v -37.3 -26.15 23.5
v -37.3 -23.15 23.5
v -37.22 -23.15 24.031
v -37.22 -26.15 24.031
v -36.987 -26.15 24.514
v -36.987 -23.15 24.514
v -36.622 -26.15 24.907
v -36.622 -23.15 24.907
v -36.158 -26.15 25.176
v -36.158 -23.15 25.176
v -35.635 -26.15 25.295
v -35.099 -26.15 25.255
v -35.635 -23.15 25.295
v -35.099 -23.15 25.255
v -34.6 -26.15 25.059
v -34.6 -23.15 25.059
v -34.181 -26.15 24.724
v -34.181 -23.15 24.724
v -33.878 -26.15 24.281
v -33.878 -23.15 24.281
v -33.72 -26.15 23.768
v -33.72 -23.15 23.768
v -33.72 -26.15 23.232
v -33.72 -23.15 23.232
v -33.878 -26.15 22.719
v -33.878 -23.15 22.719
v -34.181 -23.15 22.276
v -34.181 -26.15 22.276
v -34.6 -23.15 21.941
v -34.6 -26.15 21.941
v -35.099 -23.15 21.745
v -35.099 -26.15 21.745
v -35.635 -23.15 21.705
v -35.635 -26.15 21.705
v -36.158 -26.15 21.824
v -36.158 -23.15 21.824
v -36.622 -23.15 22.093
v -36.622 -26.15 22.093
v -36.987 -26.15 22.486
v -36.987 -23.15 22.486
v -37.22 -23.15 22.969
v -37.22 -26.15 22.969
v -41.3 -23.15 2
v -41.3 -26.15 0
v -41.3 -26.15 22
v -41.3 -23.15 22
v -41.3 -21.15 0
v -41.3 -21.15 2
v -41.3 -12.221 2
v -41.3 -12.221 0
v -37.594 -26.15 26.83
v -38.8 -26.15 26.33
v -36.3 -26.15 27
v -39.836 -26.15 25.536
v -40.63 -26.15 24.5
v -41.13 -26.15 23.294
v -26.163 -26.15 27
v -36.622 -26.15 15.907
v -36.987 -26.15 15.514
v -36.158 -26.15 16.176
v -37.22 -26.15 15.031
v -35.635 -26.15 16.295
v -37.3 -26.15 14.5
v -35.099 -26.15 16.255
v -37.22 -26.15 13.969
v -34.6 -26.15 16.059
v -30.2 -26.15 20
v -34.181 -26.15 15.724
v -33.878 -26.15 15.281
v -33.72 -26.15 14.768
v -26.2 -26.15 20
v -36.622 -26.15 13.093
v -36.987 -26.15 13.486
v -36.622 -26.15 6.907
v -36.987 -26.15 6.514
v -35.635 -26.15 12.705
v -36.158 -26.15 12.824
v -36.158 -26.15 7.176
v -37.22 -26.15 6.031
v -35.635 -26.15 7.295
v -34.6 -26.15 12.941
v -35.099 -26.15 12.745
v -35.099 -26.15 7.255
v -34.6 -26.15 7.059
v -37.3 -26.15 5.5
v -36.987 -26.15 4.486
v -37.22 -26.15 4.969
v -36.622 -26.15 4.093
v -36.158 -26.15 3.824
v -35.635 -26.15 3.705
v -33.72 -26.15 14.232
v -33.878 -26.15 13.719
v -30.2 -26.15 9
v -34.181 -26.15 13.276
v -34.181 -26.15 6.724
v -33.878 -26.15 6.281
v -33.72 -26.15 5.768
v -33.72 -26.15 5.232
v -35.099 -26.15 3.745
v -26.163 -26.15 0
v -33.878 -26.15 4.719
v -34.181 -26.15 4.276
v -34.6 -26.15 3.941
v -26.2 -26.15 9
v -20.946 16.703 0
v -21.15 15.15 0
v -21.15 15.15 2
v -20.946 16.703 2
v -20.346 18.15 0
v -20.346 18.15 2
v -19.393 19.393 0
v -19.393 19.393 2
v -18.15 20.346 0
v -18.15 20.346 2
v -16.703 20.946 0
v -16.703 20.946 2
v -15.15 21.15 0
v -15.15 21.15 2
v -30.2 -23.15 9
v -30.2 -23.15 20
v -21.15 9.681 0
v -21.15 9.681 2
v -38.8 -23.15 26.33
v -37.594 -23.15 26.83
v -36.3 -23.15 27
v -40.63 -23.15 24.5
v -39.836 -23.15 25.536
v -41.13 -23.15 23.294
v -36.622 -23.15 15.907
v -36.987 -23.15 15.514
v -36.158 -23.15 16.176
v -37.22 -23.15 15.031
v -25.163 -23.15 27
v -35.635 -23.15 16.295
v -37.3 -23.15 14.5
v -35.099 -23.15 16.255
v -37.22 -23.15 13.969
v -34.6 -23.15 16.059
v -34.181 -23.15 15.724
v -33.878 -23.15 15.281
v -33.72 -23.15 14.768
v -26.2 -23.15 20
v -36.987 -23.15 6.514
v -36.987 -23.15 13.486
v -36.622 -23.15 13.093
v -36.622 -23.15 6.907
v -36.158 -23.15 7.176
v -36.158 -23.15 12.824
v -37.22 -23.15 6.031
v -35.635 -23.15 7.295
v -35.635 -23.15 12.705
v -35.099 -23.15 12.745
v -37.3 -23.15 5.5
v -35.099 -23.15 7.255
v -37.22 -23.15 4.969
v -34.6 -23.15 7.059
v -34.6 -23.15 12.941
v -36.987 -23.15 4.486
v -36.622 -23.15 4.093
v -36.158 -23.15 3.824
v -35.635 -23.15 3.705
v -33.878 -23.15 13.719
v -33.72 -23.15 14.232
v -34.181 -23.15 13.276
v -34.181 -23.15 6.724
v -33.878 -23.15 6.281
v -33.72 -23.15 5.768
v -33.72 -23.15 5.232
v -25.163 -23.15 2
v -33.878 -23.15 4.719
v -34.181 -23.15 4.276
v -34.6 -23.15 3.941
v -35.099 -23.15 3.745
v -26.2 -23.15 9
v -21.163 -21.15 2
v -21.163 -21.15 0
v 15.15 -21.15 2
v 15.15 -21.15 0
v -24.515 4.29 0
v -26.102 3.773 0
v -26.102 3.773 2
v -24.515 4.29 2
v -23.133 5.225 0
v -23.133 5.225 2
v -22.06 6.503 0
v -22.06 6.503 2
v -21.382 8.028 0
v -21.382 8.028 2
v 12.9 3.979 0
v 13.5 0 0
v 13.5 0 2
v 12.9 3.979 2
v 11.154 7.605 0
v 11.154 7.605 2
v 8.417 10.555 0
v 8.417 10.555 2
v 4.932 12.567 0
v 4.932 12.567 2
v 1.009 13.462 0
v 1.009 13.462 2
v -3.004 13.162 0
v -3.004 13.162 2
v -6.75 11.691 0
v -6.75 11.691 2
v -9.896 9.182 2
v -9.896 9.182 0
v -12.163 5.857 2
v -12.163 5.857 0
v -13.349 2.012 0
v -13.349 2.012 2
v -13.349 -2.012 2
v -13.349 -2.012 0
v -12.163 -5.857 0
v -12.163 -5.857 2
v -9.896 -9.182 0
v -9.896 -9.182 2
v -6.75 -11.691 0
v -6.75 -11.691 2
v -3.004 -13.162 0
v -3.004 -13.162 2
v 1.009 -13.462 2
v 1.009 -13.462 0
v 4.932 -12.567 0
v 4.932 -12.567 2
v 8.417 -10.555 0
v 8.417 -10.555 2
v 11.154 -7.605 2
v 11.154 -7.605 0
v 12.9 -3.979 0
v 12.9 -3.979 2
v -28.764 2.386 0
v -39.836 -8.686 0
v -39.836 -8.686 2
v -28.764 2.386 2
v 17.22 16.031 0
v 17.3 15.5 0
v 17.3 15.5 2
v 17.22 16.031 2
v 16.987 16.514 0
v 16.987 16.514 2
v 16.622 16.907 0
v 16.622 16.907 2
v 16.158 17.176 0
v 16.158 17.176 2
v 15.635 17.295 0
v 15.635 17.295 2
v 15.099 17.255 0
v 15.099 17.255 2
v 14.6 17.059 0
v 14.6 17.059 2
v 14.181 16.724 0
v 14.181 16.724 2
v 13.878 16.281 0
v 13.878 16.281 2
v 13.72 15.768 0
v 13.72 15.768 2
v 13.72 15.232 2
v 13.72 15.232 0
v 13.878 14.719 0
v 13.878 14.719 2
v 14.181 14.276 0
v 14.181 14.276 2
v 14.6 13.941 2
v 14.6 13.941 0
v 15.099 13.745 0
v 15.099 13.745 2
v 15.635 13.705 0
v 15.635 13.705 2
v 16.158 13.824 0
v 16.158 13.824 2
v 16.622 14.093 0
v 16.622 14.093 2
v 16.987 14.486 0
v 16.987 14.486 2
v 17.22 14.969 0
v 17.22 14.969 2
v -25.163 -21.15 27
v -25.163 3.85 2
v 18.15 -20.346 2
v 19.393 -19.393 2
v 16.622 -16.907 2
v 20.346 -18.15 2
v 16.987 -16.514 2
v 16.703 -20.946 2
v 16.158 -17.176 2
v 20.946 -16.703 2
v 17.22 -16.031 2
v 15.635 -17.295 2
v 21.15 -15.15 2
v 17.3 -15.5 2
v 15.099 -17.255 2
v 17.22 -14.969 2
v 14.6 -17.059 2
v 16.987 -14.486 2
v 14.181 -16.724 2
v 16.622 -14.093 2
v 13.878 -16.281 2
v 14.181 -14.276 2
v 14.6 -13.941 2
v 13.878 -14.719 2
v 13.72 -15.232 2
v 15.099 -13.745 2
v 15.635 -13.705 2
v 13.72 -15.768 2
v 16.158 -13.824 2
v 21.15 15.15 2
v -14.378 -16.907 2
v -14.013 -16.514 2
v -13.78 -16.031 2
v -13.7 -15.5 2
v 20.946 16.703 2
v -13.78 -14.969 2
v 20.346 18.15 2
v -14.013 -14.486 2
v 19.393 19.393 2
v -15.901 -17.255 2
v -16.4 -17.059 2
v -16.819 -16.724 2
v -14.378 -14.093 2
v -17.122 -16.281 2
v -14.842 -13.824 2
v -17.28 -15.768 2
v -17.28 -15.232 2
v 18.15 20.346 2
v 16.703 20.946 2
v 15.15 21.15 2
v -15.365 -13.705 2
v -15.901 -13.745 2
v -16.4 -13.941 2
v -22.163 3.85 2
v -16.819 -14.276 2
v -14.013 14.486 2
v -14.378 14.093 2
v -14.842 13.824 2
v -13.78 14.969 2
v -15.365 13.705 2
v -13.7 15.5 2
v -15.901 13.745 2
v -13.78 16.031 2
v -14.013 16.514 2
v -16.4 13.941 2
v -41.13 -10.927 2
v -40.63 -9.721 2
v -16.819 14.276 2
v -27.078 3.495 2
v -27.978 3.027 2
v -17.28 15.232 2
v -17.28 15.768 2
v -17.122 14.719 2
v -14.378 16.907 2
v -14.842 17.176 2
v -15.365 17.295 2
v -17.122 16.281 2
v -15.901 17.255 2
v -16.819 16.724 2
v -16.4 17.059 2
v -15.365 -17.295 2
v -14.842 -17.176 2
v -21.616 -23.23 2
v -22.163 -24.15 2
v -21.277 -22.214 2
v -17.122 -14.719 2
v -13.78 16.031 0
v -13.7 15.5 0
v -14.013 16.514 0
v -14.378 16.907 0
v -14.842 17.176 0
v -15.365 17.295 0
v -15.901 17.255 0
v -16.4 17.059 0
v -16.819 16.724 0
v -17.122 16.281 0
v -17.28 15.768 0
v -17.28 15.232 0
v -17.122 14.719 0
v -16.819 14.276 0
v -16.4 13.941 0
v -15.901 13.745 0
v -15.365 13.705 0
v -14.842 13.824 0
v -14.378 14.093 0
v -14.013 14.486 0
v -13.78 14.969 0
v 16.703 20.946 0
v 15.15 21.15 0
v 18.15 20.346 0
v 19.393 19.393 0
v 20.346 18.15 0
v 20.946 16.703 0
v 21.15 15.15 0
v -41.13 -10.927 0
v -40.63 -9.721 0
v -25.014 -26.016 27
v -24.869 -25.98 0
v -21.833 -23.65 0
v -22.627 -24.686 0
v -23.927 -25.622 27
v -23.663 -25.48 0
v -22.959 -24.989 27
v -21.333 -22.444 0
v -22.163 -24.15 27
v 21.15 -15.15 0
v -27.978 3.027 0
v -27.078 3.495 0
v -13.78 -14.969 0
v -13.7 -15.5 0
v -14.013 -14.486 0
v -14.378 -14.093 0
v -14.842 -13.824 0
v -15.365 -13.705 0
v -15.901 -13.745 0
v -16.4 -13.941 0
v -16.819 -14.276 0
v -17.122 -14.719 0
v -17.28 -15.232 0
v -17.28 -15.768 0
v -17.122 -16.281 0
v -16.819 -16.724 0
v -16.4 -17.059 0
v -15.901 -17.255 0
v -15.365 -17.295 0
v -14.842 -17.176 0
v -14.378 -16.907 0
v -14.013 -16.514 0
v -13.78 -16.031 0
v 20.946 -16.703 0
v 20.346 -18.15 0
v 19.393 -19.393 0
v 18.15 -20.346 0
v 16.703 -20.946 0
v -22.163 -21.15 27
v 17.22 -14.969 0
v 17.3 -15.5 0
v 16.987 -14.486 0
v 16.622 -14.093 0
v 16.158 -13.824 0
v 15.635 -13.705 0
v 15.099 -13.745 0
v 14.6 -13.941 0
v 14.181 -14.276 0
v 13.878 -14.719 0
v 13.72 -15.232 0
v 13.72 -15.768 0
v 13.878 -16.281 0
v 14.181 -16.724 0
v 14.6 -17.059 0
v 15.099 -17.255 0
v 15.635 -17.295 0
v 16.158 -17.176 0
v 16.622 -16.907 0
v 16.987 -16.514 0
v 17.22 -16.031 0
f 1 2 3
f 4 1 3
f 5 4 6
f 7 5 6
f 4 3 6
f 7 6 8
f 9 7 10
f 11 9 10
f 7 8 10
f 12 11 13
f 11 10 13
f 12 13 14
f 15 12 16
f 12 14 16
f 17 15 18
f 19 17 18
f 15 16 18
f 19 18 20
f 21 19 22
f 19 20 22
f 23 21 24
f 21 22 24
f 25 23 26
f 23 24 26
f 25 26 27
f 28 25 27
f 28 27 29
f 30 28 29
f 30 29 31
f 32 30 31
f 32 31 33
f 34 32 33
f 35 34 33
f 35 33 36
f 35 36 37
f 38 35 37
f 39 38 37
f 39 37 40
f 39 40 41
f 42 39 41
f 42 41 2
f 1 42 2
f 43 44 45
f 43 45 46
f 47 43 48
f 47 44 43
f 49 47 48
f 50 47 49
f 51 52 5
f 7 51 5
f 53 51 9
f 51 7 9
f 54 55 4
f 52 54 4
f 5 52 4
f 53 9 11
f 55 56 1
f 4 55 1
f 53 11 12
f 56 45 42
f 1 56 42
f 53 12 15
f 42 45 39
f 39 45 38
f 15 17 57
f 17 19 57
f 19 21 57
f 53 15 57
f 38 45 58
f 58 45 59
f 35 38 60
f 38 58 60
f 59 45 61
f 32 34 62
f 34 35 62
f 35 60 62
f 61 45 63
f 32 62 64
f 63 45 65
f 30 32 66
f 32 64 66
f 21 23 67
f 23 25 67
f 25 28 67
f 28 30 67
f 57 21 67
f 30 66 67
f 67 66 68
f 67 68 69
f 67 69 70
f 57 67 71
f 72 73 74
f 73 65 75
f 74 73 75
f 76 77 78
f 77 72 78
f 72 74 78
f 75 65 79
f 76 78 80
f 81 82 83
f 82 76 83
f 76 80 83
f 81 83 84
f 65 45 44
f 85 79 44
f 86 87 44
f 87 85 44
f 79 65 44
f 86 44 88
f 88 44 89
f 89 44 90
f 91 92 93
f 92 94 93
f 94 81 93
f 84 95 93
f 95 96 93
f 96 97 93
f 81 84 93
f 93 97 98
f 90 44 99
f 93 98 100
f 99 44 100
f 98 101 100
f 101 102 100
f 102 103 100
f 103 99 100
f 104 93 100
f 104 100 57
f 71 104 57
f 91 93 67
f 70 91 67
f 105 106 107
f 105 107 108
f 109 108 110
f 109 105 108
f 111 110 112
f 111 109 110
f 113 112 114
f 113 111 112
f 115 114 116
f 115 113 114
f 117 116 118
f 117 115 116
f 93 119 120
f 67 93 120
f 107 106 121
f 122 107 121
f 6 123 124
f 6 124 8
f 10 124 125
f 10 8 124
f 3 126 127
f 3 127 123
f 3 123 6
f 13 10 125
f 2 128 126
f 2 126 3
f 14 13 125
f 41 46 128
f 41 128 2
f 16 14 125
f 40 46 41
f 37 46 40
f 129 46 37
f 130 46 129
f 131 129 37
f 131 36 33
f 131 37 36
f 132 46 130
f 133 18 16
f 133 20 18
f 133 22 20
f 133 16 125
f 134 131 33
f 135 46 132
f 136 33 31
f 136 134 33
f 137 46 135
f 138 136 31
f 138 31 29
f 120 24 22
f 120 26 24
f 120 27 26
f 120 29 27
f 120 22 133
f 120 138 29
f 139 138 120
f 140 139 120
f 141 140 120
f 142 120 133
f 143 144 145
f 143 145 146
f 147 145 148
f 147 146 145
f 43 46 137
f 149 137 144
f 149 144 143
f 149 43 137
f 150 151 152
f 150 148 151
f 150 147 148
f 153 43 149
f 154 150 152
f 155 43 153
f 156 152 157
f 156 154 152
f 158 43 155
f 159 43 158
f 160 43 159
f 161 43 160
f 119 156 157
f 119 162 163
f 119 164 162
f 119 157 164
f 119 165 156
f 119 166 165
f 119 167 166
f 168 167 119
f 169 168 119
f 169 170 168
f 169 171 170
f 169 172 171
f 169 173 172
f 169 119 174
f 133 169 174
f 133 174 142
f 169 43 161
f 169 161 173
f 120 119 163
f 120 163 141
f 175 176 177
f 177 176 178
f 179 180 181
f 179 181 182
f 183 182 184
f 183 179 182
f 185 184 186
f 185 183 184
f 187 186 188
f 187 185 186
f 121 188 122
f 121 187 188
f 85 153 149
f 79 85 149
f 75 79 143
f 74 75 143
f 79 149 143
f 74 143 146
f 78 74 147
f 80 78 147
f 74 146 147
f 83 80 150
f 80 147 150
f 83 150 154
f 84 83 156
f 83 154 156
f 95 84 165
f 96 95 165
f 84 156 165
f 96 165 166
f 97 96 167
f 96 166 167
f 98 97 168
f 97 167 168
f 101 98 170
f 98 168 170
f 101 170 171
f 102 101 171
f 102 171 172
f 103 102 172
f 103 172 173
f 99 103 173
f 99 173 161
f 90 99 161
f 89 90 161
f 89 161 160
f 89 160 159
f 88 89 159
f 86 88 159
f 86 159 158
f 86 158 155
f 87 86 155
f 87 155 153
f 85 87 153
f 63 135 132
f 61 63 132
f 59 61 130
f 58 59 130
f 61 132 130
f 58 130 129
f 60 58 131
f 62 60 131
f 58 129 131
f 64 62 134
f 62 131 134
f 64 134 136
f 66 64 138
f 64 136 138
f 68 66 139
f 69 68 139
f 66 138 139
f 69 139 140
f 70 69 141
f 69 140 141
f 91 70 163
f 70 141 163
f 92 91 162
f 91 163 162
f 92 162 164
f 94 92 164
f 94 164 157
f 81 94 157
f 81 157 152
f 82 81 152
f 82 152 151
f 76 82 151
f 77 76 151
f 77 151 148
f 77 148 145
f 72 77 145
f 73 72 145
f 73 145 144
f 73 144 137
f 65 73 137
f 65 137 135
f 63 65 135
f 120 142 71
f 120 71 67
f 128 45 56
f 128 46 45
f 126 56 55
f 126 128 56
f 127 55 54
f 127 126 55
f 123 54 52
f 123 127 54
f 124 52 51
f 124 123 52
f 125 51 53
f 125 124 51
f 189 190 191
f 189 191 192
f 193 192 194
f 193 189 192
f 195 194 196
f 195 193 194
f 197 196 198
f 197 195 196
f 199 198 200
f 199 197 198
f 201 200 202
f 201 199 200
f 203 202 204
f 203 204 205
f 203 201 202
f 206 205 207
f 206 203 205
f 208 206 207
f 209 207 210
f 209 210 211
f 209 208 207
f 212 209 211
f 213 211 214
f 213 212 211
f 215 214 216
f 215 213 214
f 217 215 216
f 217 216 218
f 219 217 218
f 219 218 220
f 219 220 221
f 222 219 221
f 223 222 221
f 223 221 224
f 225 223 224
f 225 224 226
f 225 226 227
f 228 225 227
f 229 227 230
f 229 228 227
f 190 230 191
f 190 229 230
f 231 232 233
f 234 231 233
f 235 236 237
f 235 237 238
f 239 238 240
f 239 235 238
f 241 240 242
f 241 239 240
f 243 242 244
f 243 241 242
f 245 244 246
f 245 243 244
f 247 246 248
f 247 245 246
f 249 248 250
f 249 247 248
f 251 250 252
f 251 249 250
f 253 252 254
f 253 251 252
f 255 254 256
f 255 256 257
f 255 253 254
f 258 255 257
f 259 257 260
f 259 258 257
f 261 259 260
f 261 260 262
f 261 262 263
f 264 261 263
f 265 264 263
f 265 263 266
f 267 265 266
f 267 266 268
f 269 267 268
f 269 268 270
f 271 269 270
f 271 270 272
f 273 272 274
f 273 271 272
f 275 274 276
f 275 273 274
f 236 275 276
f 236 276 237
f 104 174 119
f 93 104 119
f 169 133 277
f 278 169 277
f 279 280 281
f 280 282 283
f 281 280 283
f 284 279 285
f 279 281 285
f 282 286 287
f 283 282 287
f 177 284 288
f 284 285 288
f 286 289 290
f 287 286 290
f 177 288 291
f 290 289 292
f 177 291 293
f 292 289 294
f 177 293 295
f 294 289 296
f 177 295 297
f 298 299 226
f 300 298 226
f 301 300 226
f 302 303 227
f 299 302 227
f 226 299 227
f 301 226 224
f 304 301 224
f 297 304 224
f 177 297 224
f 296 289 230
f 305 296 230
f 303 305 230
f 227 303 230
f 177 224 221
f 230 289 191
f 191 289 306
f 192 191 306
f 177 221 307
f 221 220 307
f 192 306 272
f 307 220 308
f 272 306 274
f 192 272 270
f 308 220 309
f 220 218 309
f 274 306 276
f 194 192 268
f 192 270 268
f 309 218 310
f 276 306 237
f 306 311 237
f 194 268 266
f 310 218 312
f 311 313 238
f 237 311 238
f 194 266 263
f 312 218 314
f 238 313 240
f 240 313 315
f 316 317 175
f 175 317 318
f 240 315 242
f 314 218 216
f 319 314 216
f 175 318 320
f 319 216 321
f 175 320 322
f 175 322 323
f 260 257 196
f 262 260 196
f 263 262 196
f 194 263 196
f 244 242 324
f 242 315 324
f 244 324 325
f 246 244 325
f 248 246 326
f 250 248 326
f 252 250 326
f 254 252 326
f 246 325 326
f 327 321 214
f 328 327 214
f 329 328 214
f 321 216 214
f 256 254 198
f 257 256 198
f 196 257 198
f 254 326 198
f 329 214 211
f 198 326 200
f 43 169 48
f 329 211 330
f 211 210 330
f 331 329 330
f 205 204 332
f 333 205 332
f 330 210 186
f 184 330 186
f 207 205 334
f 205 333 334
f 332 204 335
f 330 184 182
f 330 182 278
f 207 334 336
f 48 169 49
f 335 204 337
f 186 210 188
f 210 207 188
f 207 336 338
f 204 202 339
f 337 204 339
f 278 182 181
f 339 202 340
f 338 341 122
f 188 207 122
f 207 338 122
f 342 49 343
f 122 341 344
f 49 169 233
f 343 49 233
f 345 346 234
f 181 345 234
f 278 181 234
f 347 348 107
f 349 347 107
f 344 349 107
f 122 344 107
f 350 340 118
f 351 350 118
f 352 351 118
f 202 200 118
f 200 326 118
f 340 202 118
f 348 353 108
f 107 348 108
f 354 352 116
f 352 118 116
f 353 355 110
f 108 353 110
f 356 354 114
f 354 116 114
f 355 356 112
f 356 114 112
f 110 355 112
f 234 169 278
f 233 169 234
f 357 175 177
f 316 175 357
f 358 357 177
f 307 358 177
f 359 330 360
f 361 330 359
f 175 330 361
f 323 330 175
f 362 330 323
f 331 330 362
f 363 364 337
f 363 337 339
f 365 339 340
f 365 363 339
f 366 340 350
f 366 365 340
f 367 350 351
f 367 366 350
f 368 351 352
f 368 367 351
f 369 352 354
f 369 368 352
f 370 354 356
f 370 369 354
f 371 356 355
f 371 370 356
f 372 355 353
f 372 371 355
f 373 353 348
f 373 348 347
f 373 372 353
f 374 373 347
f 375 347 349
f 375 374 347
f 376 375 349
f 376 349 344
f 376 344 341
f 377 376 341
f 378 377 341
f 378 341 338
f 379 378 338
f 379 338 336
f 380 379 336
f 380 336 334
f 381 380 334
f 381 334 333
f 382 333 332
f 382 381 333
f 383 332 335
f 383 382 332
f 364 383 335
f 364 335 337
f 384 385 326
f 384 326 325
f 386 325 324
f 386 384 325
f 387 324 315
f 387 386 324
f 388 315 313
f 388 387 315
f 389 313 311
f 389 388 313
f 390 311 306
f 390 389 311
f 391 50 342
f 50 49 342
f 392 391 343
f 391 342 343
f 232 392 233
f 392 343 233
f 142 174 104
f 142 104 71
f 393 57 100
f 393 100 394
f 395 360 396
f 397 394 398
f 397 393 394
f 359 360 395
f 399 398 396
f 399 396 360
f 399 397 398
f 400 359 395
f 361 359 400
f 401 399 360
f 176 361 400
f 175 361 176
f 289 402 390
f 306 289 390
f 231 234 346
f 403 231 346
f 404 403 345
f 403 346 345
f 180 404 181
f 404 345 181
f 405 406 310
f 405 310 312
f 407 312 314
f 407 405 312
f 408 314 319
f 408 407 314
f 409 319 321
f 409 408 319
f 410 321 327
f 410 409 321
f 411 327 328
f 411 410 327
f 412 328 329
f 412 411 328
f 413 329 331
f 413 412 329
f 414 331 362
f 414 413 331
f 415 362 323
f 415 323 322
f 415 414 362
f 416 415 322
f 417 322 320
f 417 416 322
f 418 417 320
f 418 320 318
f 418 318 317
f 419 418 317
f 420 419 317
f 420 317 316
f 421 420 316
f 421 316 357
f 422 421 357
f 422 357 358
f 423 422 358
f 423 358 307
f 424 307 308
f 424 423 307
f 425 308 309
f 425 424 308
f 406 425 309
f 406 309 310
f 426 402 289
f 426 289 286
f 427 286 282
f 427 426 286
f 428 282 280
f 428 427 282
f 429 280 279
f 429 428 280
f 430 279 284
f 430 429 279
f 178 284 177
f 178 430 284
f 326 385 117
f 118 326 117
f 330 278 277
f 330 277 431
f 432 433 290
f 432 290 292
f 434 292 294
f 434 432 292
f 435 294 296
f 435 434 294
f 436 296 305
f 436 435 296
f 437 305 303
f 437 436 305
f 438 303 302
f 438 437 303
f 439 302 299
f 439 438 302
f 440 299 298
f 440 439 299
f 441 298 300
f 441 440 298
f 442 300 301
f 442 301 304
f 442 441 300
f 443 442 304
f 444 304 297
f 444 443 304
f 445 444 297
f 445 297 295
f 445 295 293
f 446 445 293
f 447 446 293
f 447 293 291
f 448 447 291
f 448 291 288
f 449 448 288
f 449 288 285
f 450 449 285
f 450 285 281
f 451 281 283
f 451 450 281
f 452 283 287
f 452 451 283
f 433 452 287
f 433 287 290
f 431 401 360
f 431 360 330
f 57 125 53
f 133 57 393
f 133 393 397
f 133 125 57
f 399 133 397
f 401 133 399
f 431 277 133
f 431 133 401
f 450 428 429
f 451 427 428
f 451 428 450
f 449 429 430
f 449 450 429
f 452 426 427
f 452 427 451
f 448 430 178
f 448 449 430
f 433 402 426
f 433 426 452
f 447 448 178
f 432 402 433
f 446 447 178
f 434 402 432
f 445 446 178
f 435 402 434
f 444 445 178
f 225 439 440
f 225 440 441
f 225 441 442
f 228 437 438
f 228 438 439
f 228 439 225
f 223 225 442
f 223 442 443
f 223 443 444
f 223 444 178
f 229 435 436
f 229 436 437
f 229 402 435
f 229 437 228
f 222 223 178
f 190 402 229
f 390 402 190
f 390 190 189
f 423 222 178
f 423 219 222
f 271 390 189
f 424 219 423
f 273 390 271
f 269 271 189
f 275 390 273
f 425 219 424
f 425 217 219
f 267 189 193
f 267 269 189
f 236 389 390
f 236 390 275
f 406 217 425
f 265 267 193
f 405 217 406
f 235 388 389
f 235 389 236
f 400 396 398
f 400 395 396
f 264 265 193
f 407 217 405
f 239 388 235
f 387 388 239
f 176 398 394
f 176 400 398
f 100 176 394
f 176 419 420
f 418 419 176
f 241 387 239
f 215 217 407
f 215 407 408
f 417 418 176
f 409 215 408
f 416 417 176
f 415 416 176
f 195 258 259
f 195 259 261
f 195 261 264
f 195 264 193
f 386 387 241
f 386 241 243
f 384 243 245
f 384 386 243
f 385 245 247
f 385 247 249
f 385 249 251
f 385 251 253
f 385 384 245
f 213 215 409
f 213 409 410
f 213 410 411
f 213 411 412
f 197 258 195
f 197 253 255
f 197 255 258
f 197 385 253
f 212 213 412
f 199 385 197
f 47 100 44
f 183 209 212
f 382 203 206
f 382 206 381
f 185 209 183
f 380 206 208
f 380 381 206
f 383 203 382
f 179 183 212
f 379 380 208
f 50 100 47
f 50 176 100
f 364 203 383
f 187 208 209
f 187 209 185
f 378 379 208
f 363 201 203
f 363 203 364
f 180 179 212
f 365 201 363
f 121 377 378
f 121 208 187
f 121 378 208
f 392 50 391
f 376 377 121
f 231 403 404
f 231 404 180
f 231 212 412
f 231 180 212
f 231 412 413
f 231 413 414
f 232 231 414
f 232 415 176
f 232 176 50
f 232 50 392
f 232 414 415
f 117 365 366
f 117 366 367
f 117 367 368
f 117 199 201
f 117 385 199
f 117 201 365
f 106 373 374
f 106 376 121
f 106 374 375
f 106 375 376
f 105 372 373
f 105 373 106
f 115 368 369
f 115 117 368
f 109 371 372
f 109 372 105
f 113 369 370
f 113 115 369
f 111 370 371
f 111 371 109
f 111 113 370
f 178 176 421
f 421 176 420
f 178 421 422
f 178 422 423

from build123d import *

# Parameters (mm, degrees)
F0_R         = 1.8
F0_R_2       = 13.5
F0_W         = 20.1372796029
F0_H         = 5
F1_DEPTH     = 2
F2_W         = 3
F2_H         = 30
F3_DEPTH     = 27
F4_W         = 16.1372796029
F4_H         = 3
F5_DEPTH     = 25
F6_R         = 1.8
F6_W         = 4
F6_H         = 11
F7_DEPTH     = 25
F8_SIZE      = 25
F9_SIZE      = 14
F10_R        = 4.99999
F11_T1_DEPTH = 2
F11_T3_DEPTH = 32


# Not quite as in the source:
# - a fillet or chamfer that OpenCascade refuses, or shapes differently, is made with other operations: its cross-section is extruded or revolved along the edge and cut away or added
# - a fillet or chamfer is up to 0.001 mm smaller than in the source, because OpenCascade refuses the exact size


with BuildPart() as f1:
    # F0 (on Top) → F1 (new body)
    with BuildSketch(Plane.XY):
        Polygon((21.15, -21.15), (21.15, 21.15), (-21.15, 21.15), (-21.15, 3.85), (-21.15, -21.15), align=None)
        with Locations((-15.5, -15.5)):
            Circle(F0_R, mode=Mode.SUBTRACT)
        with Locations((15.5, -15.5)):
            Circle(F0_R, mode=Mode.SUBTRACT)
        with Locations((-15.5, 15.5)):
            Circle(F0_R, mode=Mode.SUBTRACT)
        Circle(F0_R_2, mode=Mode.SUBTRACT)
        with Locations((15.5, 15.5)):
            Circle(F0_R, mode=Mode.SUBTRACT)
        Polygon((-21.15, -21.15), (-21.15, 3.85), (-41.3, 3.85), (-41.3, -21.15), (-21.1627203971, -21.15), align=None)
        with Locations((-31.2313601986, -23.65)):
            Rectangle(F0_W, F0_H)
    extrude(amount=F1_DEPTH)

    # F2 (on Top) → F3 (join)
    with BuildSketch(Plane.XY):
        with Locations((-23.6627203971, -11.15)):
            Rectangle(F2_W, F2_H)
    extrude(amount=F3_DEPTH)

    # F4 (on face) → F5 (join)
    with BuildSketch(Plane.XY.offset(2)):
        with Locations((-33.2313601986, -24.65)):
            Rectangle(F4_W, F4_H)
    extrude(amount=F5_DEPTH)

    # F6 (on face) → F7 (cut)
    with BuildSketch(Plane(origin=(0, -23.15, 0), x_dir=(-1, 0, 0), z_dir=(0, 1, 0))):
        with Locations((35.5, 14.5)):
            Circle(F6_R)
        with Locations((35.5, 5.5)):
            Circle(F6_R)
        with Locations((35.5, 23.5)):
            Circle(F6_R)
        with Locations((28.2, 14.5)):
            Rectangle(F6_W, F6_H)
    extrude(amount=-F7_DEPTH, mode=Mode.SUBTRACT)

    # F8
    f8_edges = [f1.edges().sort_by_distance(p)[0] for p in [
        (-23.66272, 3.85, 27),
    ]]
    chamfer(f8_edges, length=F8_SIZE)

    # F9
    f9_edges = [f1.edges().sort_by_distance(p)[0] for p in [
        (-41.3, 3.85, 1),
    ]]
    chamfer(f9_edges, length=F9_SIZE)

    # F10 (radius 5 in the source; OpenCascade refuses exactly that, so slightly less here)
    f10_edges = [f1.edges().sort_by_distance(p)[0] for p in [
        (-41.3, -10.15, 1),
        (-27.3, 3.85, 1),
        (-21.16272, -26.15, 1),
        (-41.3, -24.65, 27),
    ]]
    fillet(f10_edges, radius=F10_R)

    # F11: fillet of radius 6 on 4 edges, made by hand

    # F11_s2 → F11_t1 (join)
    with BuildSketch(Plane.XY):
        with BuildLine():
            ThreePointArc((-26.1021461366, 3.7731598692), (-22.5517871308, 5.8265464621), (-21.15, 9.6809515277))
            Line((-21.15, 9.6809515277), (-20.55, 9.6809515277))
            Line((-20.55, 9.6809515277), (-20.55, 3.85))
            Line((-20.55, 3.85), (-21.15, 3.25))
            ThreePointArc((-21.15, 3.25), (-25.2289363303, 3.25), (-25.9973607503, 3.1823807033))
            Line((-25.9973607503, 3.1823807033), (-26.1021461366, 3.7731598692))
        make_face()
    extrude(amount=F11_T1_DEPTH)

    # F11_s4 → F11_t3 (cut)
    with BuildSketch(Plane.XY.offset(-15)):
        with BuildLine():
            ThreePointArc((21.15, -15.15), (19.3926406871, -19.3926406871), (15.15, -21.15))
            Line((15.15, -21.15), (21.15, -21.15))
            Line((21.15, -21.15), (21.15, -15.15))
        make_face()
        with BuildLine():
            ThreePointArc((15.15, 21.15), (19.3926406871, 19.3926406871), (21.15, 15.15))
            Line((21.15, 15.15), (21.15, 21.15))
            Line((21.15, 21.15), (15.15, 21.15))
        make_face()
        with BuildLine():
            ThreePointArc((-21.15, 15.15), (-19.3926406871, 19.3926406871), (-15.15, 21.15))
            Line((-15.15, 21.15), (-21.15, 21.15))
            Line((-21.15, 21.15), (-21.15, 15.15))
        make_face()
    extrude(amount=F11_T3_DEPTH, mode=Mode.SUBTRACT)


solid = f1.part
